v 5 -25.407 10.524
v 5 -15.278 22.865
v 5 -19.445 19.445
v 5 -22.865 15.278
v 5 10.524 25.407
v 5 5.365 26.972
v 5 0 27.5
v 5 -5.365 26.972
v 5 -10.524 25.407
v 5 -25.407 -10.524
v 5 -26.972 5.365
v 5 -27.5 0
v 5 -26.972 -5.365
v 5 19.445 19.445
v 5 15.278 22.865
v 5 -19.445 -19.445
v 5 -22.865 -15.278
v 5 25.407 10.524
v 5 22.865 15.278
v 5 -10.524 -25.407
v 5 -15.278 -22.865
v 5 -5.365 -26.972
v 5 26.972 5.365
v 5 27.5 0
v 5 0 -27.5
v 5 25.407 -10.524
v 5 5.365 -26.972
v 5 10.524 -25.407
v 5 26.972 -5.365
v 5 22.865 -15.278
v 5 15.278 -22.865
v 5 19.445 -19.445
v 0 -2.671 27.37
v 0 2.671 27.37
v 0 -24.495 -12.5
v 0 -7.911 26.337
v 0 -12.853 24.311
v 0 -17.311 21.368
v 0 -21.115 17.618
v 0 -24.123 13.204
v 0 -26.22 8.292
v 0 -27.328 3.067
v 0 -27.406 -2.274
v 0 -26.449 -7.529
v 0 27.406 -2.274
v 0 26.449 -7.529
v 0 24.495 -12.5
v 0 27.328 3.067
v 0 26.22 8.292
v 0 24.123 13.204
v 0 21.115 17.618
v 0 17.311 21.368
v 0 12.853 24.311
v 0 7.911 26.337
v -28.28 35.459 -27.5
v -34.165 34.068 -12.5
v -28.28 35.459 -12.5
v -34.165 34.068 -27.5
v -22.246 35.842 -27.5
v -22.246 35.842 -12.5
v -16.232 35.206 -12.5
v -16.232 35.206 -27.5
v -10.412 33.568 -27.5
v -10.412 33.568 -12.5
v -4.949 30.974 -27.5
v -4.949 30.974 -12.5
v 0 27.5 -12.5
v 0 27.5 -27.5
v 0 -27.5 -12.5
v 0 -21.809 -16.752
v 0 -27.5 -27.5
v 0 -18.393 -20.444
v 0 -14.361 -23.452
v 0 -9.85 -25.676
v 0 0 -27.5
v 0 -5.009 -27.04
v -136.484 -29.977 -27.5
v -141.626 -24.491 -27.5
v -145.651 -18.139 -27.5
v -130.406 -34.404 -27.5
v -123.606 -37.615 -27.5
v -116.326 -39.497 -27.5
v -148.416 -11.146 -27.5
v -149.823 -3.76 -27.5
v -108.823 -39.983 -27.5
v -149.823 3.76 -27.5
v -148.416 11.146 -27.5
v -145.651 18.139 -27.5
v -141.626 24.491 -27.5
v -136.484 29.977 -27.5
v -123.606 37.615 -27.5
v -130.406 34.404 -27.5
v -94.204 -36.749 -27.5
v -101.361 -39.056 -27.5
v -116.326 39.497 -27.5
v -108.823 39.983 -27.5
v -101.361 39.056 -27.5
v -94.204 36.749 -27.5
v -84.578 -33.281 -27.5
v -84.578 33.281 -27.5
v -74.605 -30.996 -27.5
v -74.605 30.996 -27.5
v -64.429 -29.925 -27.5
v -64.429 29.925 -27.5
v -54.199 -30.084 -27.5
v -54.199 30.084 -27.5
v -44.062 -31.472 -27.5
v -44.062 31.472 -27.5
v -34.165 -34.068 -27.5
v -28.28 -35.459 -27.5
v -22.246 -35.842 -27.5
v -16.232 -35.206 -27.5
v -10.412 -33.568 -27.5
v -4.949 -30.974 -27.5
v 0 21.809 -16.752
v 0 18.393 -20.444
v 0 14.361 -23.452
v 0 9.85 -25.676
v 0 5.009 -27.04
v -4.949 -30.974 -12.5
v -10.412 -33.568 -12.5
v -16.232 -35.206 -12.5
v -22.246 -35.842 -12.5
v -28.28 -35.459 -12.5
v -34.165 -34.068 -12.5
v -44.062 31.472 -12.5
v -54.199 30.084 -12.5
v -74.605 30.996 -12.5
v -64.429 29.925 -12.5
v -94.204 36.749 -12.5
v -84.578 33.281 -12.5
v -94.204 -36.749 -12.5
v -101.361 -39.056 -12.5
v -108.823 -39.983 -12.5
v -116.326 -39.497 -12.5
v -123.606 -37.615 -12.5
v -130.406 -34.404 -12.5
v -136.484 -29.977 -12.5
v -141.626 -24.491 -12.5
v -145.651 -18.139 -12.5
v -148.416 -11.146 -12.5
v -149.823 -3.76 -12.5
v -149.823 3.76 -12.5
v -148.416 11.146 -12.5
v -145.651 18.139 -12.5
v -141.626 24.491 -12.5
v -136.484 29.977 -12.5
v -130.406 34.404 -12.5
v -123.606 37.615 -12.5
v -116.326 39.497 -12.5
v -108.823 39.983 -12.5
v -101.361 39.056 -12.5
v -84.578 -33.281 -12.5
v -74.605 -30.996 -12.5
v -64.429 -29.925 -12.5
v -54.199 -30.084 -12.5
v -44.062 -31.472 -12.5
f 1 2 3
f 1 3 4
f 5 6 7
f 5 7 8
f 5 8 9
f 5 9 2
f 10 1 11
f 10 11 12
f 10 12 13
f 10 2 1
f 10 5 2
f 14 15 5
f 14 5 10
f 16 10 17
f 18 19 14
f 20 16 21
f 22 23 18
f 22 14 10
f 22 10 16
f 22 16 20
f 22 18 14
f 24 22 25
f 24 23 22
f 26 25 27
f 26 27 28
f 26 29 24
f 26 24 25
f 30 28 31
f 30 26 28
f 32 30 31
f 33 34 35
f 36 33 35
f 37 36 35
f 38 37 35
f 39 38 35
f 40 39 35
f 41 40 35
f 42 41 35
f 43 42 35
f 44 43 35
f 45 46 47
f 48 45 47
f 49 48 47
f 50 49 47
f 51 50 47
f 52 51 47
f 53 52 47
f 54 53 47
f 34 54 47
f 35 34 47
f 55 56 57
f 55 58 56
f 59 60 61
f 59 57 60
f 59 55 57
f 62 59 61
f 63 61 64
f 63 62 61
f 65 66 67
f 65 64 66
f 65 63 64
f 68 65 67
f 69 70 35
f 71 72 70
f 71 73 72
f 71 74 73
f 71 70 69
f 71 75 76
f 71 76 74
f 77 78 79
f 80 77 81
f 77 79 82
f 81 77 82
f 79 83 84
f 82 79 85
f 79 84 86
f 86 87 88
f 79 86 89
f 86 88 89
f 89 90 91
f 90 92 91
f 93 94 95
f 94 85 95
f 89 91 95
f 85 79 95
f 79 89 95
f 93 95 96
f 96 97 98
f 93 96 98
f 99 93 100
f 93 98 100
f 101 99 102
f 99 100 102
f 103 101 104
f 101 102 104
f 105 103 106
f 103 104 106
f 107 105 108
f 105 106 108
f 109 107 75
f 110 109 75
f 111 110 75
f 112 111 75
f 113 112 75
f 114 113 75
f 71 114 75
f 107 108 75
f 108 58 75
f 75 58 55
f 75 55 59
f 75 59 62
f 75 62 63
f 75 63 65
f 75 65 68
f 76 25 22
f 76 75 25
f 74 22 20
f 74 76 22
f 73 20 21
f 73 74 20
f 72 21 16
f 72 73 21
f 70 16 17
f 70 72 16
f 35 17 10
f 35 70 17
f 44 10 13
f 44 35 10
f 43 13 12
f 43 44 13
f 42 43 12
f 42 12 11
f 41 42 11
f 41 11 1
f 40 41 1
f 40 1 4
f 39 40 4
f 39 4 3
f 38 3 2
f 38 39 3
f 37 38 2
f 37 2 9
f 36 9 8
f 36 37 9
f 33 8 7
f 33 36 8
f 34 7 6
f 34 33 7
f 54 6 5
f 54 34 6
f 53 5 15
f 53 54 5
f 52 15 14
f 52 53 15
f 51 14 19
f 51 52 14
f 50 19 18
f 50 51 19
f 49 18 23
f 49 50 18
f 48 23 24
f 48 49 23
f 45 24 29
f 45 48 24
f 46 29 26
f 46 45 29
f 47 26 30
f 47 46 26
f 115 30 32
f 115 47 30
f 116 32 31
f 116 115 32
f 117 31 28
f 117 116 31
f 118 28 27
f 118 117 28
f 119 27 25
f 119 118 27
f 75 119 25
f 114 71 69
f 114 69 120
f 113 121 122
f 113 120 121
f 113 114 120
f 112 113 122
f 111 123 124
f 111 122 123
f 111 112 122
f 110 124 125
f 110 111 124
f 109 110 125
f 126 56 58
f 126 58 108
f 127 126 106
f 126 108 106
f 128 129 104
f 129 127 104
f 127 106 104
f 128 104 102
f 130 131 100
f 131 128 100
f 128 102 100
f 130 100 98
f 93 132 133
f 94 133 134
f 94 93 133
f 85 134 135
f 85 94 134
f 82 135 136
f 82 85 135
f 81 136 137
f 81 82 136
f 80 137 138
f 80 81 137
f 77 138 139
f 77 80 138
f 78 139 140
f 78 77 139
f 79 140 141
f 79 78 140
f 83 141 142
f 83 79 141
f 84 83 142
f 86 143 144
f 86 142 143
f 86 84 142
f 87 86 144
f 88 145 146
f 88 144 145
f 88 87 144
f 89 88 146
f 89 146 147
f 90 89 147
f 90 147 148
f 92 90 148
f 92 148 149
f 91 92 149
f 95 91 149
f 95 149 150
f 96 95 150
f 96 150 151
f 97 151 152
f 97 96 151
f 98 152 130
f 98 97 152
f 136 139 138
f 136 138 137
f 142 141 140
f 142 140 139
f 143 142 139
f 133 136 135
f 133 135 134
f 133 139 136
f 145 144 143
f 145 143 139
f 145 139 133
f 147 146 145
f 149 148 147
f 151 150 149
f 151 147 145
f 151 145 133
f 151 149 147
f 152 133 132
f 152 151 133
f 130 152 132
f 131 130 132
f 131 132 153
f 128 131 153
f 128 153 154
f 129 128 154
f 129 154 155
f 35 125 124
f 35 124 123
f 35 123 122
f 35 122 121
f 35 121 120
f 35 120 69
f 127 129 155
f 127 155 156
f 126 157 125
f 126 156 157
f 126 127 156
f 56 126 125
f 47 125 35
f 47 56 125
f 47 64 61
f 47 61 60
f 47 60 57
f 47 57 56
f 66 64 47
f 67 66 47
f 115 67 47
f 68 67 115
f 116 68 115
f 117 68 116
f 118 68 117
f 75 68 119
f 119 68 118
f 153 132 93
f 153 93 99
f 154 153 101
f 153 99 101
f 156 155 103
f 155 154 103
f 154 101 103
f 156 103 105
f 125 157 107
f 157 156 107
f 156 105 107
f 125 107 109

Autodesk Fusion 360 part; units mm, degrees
sketch "Sketch1" plane through (0, 0, 0) normal (1, 0, 0) x (0, 0, -1)
  circle A0 centre (0, 0) radius 27.5
  dimension "d1" = 55
extrude "Extrude1" add sketch "Sketch1" along normal blind 5
ref_plane "WorkPlane1" through (0, 0, -27.5) normal (0, 0, 1) x (1, 0, 0)
sketch "Sketch2" plane through (0, 0, -27.5) normal (0, 0, 1) x (1, 0, 0)
  line L0 (0, 0) -> (-150, 0)
  line L1 (0, 0) -> (-23, 0)
  line L2 (-150, 0) -> (-110, 0)
  line L3 (0, 0) -> (0, 27.5)
  circle A0 centre (-23, 0) radius 35.8504
  circle A1 centre (-110, 0) radius 40
  line L4 (0, 27.5) -> (0, -27.5)
  arc A2 (-94.2038, 36.7489) -> (-34.165, 34.0675) centre (-60.6369, 114.8402) ccw
  arc A3 (-34.165, -34.0675) -> (-94.2038, -36.7489) centre (-60.6369, -114.8402) ccw
  point P0 (0, -27.5)
  point P1 (0, 27.5)
  dimension "d6" = 150
  dimension "d7" = 23
  dimension "d8" = 40
  dimension "d9" = 27.5
  dimension "d10" = 85
extrude "Extrude2" add sketch "Sketch2" along normal blind 15 contours L0 L1 A0 L4 | L0 L1 L3 A0 L4 | L0 A0 A1 A3 | L0 A0 A1 A2 | L0 L2 A1 | L0 L2 A1
